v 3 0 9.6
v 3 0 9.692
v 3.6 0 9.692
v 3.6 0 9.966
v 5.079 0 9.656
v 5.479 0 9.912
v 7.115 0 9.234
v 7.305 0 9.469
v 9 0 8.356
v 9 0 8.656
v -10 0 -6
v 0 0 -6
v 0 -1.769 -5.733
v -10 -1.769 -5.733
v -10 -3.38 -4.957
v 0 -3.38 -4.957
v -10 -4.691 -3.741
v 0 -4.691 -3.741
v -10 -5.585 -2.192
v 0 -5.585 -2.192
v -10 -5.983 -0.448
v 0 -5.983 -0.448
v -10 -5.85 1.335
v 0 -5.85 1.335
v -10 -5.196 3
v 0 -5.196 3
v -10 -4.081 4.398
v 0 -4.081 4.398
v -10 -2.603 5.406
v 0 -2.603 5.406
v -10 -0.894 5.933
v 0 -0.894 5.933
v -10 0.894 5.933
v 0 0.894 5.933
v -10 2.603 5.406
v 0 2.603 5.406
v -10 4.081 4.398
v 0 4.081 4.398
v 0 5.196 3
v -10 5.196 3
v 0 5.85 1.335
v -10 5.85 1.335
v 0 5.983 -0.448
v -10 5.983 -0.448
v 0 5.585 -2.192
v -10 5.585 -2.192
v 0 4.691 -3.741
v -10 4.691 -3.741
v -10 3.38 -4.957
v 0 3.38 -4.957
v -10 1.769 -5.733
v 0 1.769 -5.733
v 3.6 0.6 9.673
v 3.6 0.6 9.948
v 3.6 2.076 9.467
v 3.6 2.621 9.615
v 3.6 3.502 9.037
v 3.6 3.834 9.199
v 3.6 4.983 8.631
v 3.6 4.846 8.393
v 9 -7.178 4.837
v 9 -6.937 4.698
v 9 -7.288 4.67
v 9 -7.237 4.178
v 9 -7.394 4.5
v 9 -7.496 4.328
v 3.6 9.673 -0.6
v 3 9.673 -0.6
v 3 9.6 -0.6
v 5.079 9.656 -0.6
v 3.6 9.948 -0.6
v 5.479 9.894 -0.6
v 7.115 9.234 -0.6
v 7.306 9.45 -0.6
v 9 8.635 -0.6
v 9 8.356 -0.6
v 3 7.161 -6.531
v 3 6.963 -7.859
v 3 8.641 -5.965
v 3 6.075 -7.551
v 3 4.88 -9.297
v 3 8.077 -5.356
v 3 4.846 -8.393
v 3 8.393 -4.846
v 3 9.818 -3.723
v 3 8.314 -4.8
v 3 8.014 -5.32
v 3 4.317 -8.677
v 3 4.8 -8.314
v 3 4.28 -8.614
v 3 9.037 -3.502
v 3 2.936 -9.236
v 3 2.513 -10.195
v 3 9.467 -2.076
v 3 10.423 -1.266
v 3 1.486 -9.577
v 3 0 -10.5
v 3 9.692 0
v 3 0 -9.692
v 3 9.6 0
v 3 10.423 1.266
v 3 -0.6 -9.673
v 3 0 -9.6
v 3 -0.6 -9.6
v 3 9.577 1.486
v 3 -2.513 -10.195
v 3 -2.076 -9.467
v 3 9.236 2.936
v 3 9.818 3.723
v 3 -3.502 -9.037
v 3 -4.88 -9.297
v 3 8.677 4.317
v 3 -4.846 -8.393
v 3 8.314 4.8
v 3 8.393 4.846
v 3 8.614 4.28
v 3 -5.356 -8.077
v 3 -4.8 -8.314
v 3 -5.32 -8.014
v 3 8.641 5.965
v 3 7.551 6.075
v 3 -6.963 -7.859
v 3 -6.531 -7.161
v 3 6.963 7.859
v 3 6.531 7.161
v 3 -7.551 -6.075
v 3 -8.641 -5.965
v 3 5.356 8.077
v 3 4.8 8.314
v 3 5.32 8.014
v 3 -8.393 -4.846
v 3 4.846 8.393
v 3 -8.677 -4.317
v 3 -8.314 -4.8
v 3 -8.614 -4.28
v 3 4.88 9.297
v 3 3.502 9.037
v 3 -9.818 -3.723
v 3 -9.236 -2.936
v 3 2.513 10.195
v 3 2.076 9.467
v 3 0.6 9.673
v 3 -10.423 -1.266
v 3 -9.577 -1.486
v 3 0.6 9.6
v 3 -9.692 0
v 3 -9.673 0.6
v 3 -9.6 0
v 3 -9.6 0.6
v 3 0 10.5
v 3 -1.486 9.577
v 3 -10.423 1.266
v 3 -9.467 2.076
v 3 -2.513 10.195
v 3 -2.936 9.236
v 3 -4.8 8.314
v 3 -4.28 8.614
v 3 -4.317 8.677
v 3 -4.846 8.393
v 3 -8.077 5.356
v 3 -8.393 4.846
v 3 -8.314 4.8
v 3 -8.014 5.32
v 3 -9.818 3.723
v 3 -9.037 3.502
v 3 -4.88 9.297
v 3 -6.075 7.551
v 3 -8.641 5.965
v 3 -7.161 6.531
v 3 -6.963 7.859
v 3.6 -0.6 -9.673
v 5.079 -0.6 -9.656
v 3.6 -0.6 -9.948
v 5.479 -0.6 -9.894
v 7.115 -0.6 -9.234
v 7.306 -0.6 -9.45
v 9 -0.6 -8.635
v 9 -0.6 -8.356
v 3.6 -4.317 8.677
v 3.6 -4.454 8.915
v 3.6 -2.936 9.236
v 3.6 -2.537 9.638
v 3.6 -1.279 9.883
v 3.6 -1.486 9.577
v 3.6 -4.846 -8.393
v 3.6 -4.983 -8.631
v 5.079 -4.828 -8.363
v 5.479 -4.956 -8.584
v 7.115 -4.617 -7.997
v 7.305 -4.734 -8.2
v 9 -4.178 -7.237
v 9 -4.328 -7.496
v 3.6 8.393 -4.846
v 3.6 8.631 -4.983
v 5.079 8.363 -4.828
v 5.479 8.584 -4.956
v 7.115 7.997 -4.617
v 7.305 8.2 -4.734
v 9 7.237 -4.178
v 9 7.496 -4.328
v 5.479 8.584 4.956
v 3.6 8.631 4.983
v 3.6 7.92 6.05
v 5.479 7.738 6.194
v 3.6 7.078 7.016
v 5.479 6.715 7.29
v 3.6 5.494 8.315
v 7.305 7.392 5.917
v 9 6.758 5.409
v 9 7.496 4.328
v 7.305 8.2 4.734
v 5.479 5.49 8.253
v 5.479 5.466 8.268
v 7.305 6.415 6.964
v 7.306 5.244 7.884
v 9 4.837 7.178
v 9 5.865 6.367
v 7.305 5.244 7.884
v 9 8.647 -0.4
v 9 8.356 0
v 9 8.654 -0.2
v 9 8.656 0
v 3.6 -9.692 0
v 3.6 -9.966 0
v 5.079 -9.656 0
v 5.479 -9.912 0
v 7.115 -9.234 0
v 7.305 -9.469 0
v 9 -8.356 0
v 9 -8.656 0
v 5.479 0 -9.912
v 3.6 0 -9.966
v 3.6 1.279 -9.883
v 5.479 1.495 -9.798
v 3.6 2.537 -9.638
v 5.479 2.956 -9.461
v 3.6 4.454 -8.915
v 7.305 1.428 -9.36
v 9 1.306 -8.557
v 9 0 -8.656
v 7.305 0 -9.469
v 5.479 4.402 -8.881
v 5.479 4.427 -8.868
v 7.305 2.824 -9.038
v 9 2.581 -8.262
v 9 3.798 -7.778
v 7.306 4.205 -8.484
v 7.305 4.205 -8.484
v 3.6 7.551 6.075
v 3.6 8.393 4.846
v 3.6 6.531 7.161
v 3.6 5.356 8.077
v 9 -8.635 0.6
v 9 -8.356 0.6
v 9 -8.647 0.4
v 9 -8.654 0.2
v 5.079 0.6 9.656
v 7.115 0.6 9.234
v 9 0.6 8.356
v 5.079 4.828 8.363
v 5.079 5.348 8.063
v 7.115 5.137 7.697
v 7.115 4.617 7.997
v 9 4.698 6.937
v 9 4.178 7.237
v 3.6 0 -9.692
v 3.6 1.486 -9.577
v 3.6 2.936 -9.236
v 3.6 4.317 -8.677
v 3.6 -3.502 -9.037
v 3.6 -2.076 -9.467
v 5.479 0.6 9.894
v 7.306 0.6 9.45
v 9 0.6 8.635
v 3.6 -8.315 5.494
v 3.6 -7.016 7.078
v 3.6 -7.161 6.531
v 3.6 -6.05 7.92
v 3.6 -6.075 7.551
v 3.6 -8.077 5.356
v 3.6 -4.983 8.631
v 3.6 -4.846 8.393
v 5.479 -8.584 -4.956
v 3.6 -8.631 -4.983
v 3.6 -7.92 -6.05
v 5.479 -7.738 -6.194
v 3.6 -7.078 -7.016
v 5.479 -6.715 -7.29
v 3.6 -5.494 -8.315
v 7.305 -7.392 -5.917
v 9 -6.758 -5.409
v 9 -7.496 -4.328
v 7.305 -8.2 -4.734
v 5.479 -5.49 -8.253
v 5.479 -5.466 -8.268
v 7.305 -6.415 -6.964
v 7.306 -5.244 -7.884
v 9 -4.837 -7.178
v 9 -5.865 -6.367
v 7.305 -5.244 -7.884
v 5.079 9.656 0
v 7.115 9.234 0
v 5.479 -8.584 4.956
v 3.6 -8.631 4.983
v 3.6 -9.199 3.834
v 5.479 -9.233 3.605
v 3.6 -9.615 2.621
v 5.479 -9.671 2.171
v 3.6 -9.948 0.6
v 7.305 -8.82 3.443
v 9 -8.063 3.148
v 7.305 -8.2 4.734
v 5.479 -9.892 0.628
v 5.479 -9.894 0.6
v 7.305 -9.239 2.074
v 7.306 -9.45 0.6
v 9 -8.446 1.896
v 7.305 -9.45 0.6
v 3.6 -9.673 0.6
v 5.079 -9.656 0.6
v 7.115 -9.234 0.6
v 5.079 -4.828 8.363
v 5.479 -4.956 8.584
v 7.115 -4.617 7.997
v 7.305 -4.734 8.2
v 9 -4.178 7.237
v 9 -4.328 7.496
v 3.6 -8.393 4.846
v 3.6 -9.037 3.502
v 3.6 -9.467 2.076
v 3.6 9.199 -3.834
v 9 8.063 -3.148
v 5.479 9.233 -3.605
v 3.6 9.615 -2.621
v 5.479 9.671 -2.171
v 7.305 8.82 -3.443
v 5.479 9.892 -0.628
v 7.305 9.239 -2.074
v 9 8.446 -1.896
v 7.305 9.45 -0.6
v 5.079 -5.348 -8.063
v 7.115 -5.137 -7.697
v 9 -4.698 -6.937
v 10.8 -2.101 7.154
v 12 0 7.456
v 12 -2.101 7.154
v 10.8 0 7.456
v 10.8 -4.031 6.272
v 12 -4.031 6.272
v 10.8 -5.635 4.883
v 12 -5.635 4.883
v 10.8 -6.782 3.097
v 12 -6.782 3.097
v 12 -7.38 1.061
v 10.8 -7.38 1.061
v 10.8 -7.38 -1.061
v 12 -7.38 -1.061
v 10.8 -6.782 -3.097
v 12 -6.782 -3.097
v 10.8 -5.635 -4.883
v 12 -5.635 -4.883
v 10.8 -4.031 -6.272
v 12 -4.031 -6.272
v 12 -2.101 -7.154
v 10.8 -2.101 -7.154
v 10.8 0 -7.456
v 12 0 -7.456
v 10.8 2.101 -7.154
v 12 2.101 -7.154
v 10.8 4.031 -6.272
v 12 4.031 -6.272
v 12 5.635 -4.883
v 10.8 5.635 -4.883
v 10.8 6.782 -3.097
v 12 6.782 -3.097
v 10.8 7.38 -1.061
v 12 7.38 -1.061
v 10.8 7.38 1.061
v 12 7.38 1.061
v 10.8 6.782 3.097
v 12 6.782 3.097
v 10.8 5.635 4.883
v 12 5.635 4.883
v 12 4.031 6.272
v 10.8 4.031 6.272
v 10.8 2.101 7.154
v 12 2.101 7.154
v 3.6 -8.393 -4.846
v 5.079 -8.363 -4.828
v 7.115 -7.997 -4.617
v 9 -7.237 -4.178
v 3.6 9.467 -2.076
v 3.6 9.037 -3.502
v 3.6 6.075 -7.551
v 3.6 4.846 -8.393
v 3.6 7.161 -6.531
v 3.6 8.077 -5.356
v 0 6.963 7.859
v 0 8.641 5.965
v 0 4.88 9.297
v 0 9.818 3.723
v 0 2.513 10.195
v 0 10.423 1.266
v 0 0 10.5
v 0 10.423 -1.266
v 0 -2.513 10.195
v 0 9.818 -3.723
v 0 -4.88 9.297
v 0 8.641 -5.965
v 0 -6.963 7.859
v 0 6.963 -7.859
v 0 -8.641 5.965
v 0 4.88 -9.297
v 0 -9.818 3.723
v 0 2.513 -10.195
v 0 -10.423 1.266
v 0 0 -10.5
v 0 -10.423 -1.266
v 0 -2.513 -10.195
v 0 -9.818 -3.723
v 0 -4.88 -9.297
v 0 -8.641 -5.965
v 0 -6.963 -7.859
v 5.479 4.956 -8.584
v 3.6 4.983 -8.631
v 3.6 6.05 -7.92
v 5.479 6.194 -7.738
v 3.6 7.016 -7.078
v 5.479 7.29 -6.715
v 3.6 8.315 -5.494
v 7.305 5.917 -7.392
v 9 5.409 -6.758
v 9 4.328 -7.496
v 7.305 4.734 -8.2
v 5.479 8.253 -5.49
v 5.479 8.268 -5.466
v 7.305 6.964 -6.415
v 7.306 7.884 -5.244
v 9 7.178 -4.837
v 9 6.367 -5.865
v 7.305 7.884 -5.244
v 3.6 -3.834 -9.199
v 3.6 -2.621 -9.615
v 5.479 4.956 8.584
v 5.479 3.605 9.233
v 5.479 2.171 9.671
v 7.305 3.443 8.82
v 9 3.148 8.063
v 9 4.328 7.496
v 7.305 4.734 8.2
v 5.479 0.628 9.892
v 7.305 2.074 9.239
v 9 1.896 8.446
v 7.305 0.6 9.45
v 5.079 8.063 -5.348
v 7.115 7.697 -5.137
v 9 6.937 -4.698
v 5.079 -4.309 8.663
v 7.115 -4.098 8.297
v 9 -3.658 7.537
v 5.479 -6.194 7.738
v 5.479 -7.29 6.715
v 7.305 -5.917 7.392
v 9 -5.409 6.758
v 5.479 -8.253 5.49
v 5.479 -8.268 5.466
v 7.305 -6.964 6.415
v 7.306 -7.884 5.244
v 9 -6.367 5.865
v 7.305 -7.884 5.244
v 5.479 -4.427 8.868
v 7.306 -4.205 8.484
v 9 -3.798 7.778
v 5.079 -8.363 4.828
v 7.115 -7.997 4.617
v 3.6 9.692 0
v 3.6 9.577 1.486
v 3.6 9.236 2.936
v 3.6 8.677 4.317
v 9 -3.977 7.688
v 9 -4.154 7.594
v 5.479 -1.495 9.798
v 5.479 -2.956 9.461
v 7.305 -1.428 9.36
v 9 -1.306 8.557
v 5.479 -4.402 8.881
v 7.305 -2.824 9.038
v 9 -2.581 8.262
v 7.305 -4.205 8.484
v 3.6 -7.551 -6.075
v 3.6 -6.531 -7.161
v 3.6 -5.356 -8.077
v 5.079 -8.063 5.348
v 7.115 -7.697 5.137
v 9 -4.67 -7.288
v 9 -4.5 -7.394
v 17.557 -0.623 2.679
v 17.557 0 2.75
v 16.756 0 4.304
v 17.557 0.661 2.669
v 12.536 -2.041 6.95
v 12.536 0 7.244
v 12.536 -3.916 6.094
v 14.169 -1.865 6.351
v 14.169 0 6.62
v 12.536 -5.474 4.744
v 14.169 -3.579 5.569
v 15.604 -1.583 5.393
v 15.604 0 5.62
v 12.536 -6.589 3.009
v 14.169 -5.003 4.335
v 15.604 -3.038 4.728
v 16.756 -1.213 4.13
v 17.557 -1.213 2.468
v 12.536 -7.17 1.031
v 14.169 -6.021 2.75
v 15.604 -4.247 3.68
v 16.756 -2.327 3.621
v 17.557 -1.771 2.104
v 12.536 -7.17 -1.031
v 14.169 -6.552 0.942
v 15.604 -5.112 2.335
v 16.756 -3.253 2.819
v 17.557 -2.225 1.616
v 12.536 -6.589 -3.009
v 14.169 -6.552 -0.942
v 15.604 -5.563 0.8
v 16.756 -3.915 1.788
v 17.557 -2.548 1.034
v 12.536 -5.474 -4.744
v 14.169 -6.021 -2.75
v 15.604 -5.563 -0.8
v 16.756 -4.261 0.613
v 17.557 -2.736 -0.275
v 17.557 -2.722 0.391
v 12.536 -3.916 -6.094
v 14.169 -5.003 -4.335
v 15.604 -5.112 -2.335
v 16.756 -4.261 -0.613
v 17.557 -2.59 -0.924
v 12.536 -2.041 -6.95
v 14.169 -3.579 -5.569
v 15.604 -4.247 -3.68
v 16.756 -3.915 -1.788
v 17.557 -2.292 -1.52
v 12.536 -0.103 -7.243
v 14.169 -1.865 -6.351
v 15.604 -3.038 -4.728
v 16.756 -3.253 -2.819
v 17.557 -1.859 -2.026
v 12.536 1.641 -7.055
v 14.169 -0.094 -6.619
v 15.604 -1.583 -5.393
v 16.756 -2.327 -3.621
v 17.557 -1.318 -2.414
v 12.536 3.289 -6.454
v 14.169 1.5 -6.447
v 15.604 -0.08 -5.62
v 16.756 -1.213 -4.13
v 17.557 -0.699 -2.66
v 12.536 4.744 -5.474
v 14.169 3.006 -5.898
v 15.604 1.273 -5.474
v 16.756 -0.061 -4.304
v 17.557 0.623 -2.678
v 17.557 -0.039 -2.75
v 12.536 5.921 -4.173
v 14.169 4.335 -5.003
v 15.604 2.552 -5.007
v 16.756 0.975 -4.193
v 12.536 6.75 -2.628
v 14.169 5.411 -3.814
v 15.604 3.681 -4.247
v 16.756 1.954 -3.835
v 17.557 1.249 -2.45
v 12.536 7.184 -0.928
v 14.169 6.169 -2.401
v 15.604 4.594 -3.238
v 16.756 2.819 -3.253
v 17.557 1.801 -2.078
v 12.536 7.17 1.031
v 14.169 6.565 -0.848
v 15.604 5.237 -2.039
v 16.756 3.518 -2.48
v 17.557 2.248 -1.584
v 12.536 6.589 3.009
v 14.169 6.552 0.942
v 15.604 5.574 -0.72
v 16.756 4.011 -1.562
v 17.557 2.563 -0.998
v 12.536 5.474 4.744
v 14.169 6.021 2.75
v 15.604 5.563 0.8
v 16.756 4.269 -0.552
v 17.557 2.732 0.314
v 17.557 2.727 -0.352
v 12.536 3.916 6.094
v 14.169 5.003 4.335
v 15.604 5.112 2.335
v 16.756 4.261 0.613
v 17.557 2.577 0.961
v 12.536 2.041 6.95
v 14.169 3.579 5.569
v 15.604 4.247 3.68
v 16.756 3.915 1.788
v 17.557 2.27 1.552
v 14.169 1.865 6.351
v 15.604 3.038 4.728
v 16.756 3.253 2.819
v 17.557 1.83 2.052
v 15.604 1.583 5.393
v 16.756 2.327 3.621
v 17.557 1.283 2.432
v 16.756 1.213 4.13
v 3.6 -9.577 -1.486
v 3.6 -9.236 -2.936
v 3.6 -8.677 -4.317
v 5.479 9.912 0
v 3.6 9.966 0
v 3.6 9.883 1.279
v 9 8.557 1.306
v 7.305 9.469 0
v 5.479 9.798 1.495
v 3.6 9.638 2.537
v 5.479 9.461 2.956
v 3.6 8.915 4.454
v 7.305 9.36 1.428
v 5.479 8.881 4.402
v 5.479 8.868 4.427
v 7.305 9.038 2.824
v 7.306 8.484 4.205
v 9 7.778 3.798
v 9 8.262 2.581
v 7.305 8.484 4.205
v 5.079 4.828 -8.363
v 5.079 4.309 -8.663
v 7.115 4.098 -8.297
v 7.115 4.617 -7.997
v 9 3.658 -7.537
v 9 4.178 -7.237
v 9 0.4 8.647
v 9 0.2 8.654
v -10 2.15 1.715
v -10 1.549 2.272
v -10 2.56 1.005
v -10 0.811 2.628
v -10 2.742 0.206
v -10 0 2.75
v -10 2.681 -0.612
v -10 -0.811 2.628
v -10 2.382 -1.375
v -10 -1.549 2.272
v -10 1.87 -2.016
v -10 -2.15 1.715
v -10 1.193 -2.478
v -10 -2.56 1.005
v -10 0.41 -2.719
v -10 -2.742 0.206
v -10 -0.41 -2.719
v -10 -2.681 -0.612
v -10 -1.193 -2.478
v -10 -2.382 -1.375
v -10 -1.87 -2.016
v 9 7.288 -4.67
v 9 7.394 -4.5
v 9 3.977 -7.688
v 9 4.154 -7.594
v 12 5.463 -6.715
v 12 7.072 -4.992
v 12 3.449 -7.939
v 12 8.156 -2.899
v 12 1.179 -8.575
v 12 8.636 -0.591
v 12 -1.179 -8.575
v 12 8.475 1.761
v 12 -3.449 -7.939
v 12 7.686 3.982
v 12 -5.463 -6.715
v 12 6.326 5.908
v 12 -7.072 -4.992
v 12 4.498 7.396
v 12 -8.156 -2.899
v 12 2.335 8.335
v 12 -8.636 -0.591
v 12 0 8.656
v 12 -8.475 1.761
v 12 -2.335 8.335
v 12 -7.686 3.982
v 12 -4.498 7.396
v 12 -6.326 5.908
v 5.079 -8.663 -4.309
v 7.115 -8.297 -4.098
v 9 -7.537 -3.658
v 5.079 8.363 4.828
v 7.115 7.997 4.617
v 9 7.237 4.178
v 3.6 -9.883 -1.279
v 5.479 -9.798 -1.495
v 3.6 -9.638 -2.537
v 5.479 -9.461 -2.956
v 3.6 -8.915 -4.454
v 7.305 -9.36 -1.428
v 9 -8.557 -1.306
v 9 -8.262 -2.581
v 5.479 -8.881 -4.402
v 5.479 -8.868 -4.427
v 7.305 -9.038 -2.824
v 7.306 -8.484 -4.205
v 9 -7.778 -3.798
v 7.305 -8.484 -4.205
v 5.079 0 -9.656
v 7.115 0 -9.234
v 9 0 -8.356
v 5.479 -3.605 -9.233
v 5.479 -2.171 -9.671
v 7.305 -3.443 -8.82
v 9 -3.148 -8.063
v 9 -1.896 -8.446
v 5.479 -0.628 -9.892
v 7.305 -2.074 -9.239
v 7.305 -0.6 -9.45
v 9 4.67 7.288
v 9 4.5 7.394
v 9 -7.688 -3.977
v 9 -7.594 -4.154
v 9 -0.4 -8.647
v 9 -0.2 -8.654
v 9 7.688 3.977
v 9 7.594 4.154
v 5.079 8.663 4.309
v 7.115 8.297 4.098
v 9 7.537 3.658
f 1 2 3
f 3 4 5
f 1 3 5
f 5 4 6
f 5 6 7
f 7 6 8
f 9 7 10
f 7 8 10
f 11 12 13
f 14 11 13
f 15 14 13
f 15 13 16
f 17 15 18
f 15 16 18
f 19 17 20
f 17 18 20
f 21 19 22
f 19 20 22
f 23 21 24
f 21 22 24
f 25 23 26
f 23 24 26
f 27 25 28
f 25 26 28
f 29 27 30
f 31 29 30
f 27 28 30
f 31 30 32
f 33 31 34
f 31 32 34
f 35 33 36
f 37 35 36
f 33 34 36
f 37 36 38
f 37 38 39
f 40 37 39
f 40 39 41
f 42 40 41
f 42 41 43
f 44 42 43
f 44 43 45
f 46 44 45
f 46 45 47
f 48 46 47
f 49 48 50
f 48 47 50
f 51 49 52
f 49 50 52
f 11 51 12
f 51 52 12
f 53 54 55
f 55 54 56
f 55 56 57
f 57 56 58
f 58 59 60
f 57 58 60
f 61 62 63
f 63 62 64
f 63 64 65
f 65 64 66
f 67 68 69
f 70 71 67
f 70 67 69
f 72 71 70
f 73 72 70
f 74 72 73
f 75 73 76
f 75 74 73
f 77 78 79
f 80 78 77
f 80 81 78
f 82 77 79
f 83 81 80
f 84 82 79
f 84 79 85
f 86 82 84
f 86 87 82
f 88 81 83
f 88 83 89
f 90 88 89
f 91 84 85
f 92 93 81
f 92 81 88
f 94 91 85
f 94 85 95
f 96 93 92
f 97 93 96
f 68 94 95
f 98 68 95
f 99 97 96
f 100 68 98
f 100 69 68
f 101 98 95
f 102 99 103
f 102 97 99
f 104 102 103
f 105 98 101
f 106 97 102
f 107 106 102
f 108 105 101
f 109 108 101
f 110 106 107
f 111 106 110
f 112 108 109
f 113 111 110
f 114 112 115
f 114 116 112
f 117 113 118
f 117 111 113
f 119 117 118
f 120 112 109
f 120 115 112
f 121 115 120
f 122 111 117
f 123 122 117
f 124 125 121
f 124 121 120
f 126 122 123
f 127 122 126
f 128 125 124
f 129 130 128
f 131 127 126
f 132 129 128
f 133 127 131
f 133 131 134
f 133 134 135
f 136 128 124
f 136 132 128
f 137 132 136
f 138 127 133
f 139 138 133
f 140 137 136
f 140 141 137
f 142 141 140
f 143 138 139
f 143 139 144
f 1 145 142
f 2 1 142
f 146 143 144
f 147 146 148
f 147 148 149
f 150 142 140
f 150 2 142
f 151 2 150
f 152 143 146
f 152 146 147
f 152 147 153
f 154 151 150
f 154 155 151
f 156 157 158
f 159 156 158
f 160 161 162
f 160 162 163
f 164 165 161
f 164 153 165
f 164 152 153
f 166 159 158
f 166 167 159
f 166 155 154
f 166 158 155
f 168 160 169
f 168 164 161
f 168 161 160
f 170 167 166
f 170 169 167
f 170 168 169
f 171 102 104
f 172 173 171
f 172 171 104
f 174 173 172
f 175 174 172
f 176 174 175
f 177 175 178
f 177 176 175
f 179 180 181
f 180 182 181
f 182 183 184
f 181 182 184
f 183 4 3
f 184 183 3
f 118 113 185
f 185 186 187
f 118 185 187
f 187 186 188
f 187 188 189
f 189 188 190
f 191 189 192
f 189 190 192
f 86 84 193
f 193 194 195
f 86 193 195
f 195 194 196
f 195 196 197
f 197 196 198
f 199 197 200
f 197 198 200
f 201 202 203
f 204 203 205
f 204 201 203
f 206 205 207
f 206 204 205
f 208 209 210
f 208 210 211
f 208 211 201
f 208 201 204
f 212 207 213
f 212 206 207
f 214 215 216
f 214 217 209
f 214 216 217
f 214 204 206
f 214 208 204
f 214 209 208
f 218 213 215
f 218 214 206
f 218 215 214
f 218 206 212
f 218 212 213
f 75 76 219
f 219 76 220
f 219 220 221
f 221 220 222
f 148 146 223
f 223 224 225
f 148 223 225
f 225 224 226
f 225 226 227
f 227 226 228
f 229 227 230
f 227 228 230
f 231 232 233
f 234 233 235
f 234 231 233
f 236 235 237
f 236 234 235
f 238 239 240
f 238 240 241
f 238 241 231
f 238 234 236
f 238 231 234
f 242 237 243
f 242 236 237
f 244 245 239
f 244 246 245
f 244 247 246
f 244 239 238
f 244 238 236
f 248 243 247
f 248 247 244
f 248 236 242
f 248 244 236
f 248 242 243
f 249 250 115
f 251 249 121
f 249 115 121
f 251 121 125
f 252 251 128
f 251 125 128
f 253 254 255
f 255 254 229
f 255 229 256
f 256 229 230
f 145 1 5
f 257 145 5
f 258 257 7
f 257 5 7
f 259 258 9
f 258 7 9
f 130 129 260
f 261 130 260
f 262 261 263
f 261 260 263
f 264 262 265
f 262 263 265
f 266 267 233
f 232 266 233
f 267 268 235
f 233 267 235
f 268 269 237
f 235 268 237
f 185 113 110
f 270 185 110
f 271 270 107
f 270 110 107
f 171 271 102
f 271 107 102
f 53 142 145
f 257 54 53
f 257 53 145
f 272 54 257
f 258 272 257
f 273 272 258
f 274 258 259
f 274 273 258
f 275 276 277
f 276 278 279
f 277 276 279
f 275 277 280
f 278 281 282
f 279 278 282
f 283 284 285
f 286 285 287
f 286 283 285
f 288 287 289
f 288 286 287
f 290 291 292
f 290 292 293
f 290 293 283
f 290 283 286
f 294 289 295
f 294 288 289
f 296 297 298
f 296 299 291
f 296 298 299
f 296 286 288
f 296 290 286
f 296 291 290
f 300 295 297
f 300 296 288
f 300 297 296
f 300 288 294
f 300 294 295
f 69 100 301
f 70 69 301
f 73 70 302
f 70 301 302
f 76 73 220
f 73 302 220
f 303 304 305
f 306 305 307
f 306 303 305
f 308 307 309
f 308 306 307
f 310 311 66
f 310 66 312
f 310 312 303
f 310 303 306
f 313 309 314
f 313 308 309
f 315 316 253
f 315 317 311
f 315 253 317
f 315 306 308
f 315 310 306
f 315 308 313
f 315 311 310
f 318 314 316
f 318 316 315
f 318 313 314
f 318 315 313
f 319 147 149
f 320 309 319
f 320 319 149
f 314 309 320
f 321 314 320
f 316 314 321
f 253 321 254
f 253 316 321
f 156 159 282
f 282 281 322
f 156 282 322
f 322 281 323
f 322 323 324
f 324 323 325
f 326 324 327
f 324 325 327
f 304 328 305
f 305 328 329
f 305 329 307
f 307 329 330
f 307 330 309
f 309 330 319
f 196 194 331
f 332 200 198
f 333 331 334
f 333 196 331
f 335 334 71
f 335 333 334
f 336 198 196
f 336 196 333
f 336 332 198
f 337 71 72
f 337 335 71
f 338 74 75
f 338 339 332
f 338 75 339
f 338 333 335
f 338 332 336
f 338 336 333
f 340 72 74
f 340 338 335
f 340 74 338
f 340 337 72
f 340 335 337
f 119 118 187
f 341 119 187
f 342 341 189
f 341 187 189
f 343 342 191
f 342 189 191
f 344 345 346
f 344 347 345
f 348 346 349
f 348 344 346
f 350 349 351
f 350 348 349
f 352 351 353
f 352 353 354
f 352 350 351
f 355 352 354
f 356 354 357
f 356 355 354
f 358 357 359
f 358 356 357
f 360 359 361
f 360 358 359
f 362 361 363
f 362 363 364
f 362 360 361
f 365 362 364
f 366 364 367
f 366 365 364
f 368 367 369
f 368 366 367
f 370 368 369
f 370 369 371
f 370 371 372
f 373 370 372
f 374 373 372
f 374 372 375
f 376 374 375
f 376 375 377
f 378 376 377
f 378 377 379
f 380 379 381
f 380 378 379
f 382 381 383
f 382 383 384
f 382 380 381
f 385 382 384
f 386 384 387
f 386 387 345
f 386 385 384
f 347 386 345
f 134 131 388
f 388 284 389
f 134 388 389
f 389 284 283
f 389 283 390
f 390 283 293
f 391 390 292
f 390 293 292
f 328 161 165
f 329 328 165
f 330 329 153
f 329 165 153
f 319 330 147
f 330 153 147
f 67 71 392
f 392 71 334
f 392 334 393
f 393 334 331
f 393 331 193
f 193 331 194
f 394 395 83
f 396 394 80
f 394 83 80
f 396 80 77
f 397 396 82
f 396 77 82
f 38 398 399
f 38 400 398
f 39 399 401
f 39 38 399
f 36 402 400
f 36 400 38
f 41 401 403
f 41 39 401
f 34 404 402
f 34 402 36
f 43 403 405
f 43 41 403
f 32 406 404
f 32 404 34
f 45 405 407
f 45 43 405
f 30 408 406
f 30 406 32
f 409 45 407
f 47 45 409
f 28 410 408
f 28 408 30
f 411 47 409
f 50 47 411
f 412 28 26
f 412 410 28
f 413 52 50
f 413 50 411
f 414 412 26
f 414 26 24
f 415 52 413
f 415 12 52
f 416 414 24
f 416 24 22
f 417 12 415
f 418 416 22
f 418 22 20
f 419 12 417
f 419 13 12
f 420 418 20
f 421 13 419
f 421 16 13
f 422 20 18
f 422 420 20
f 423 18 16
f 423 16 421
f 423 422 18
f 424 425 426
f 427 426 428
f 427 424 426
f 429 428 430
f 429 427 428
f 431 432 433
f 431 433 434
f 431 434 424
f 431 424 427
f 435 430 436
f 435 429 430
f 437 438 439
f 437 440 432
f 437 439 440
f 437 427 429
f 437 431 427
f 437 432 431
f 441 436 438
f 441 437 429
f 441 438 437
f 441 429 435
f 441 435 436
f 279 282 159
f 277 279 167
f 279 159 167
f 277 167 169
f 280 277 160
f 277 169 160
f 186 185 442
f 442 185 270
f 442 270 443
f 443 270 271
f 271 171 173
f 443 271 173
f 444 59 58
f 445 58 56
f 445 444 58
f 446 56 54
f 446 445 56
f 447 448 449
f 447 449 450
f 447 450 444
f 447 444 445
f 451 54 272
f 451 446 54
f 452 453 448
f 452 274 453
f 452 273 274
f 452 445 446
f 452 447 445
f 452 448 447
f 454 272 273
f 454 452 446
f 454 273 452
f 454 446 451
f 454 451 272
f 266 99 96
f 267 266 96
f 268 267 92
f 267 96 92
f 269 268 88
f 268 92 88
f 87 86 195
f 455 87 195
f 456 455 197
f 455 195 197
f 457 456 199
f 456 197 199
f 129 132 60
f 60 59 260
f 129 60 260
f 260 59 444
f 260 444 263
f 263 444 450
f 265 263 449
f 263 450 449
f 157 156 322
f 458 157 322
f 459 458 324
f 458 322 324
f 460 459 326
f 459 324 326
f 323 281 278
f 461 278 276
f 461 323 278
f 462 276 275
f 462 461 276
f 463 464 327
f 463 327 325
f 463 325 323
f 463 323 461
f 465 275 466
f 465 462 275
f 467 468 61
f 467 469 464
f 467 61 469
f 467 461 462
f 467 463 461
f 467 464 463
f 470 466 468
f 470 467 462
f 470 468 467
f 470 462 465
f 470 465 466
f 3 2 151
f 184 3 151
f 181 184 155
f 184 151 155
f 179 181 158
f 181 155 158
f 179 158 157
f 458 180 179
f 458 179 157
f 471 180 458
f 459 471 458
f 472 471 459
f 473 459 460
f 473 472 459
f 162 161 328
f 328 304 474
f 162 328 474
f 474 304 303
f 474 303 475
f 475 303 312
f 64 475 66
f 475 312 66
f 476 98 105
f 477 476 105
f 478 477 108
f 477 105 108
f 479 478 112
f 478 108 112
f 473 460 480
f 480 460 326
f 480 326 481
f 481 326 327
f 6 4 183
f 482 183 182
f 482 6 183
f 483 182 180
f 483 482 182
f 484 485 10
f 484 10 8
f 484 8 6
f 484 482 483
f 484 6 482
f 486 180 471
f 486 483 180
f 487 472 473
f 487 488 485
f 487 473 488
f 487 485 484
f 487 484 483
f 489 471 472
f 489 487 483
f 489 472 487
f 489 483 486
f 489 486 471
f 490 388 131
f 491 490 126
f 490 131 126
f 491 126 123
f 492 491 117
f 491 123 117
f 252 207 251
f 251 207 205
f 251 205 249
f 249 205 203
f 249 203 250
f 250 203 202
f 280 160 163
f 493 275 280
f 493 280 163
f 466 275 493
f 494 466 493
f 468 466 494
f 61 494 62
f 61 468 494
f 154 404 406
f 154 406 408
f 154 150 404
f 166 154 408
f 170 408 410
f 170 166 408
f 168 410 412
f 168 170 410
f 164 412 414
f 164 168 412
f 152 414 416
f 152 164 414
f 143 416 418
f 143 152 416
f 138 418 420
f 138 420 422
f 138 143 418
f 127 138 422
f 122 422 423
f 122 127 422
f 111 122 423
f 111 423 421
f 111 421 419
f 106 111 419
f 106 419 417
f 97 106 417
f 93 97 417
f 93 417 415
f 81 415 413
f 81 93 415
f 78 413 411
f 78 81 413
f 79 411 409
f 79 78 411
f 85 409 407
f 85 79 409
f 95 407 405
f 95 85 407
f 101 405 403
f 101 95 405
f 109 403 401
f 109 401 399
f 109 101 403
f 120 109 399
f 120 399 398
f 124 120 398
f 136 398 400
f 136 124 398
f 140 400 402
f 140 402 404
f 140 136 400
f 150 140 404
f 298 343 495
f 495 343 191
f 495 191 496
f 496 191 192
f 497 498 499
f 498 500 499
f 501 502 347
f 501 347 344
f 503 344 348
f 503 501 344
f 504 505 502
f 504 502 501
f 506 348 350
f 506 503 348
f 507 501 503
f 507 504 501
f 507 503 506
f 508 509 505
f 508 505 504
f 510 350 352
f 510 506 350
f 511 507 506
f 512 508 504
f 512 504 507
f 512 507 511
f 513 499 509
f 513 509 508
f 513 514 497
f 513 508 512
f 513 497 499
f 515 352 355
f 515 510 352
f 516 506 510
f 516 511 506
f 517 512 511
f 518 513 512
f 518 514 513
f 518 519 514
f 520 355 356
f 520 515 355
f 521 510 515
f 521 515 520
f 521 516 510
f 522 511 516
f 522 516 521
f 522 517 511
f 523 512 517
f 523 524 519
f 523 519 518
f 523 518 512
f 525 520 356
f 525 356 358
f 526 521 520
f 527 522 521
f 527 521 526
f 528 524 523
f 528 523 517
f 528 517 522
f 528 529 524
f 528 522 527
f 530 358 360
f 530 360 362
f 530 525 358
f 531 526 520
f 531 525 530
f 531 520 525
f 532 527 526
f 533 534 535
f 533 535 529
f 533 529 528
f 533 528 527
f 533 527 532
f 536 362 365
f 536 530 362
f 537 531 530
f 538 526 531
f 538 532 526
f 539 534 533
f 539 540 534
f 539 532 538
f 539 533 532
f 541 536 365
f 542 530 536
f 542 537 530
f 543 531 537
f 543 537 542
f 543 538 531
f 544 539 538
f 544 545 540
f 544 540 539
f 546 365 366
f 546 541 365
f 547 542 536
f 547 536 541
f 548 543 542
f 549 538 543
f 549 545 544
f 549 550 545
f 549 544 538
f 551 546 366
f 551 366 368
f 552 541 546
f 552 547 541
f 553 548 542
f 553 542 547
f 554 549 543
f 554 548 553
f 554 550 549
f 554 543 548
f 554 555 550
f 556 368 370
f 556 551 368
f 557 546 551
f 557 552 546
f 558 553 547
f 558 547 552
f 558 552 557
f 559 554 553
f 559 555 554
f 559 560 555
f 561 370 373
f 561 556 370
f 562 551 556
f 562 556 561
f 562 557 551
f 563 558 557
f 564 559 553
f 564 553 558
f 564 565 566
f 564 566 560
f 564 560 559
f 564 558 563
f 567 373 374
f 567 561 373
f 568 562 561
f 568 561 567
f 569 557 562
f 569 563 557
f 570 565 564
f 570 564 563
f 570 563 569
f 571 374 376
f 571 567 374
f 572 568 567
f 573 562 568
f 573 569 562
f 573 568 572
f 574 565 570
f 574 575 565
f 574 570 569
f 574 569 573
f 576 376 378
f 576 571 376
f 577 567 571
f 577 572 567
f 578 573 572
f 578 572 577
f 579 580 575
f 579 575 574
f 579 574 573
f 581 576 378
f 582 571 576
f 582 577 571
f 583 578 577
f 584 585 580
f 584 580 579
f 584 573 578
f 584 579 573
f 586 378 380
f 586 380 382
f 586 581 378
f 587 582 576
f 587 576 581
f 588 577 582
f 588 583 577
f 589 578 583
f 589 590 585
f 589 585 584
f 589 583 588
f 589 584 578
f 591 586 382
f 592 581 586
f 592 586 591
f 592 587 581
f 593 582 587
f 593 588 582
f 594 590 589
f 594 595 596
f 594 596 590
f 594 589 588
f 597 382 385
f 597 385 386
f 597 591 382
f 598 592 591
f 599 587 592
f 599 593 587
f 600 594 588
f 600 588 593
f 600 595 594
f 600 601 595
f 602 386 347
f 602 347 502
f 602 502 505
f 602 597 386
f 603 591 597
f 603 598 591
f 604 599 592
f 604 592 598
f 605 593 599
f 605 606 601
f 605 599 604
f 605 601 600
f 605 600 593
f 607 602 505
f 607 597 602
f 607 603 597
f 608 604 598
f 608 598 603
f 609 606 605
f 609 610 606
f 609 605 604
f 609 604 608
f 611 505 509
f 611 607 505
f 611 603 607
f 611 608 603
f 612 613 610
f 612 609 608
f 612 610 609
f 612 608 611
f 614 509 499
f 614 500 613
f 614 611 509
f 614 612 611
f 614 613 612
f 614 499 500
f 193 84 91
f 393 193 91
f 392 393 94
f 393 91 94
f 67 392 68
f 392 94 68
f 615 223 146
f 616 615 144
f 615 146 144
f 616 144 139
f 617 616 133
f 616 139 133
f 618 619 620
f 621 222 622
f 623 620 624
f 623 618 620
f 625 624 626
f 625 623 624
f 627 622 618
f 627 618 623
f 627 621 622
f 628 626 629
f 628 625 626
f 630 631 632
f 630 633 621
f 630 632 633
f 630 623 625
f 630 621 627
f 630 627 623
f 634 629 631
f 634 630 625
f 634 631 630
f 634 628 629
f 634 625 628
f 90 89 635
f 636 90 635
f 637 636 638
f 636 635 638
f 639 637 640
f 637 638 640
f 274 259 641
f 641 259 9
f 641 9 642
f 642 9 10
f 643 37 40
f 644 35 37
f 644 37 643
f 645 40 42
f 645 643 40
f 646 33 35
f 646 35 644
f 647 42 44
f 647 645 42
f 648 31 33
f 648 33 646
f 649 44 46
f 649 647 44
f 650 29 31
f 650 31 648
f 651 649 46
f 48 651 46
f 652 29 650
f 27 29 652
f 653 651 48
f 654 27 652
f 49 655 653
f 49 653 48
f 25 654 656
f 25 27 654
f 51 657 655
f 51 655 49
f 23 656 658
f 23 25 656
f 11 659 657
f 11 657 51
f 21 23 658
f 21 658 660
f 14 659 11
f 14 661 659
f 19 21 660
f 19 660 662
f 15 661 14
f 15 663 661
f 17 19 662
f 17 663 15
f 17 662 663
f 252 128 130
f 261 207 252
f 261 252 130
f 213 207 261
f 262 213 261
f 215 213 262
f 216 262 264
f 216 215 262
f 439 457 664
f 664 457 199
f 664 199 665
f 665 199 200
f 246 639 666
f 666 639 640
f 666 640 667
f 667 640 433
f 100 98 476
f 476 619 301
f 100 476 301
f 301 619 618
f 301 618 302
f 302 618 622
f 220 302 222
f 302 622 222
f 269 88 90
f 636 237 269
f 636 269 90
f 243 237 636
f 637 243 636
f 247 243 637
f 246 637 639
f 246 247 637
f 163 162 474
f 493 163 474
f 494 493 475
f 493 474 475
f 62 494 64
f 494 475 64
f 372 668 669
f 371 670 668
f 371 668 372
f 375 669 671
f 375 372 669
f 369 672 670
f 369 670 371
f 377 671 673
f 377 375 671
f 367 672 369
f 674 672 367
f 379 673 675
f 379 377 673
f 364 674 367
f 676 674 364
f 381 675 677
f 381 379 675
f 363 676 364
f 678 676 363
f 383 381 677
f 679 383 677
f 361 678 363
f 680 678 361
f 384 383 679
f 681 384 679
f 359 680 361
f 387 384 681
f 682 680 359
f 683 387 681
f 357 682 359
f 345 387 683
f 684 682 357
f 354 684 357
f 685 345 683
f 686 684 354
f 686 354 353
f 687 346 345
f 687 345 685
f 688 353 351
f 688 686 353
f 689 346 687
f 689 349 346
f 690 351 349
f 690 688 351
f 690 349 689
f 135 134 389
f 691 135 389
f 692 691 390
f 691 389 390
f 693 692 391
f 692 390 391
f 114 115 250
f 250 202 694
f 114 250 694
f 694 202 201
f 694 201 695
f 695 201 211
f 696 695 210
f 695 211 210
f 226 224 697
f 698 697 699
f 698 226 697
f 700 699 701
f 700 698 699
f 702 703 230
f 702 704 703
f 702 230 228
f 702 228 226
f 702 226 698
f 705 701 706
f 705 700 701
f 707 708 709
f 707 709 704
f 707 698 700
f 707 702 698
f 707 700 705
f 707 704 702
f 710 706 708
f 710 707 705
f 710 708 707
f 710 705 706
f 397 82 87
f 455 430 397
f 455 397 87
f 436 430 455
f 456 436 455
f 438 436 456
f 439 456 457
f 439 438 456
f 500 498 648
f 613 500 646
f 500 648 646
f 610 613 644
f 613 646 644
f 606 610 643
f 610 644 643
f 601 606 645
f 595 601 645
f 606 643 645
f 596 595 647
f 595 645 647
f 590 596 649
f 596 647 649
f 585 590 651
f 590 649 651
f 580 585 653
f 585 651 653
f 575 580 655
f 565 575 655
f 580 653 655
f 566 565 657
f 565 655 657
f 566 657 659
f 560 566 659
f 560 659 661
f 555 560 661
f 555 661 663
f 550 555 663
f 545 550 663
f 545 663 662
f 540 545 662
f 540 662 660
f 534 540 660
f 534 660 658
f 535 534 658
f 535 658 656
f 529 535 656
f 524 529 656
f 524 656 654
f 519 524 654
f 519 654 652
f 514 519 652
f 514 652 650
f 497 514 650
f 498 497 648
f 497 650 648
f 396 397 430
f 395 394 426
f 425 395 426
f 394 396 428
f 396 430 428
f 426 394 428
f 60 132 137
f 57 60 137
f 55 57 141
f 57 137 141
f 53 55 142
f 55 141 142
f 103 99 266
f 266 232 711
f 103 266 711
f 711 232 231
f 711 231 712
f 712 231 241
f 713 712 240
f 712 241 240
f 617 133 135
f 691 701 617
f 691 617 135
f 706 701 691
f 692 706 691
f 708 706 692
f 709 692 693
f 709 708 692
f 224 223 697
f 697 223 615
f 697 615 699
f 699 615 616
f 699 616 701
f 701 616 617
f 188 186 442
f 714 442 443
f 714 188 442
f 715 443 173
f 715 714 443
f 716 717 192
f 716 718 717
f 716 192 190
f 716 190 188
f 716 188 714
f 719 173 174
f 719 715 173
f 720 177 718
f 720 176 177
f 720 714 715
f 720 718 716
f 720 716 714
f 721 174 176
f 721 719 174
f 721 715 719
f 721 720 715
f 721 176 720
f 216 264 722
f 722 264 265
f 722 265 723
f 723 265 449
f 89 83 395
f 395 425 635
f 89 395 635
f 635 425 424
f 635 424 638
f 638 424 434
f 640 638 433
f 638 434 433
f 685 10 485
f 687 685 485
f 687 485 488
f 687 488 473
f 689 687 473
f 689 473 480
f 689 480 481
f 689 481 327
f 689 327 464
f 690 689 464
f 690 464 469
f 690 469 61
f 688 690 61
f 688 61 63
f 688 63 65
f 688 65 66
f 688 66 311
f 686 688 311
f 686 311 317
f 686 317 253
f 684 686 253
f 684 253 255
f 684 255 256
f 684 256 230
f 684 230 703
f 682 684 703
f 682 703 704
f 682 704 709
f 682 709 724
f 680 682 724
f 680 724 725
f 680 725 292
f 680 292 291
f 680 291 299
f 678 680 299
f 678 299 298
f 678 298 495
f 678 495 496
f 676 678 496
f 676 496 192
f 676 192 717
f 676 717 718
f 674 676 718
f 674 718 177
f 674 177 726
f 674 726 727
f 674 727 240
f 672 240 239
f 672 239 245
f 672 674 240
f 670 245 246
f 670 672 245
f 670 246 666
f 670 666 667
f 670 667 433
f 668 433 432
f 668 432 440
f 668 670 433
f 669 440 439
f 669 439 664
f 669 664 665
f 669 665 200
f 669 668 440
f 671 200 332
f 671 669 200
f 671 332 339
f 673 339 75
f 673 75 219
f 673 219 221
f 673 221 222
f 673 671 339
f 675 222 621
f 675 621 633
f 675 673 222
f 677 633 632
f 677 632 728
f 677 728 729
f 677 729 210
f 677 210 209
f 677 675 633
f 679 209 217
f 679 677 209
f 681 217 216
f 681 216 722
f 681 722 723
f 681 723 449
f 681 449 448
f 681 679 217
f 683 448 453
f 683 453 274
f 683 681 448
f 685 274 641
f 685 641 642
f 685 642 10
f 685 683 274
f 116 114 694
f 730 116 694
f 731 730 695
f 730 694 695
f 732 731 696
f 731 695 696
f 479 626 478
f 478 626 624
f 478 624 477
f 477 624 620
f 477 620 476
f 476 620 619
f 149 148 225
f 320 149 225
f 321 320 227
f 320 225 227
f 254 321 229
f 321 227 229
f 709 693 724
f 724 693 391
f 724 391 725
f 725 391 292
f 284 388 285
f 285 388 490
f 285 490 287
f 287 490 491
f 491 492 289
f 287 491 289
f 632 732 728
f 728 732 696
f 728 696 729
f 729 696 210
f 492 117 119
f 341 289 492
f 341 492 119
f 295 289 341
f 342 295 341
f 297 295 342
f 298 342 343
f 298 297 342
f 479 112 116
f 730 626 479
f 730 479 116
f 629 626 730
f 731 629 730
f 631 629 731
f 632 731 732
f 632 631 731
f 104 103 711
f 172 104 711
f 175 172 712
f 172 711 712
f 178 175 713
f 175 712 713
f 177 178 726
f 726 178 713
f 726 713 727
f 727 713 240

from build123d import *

# Parameters (mm, degrees)
ENL_V_MAT_EXTRU_2_DEPTH      = 1
R_P_TITION_CIRCULAIRE1_COUNT = 12
ESQUISSE9_R                  = 16.652952846
ESQUISSE9_R_2                = 16.152952846
ENL_V_MAT_EXTRU_3_DEPTH      = 1
ECHELLE3_SCALE               = 0.6
ESQUISSE12_R                 = 6
BOSS_EXTRU_2_DEPTH           = 10
ESQUISSE13_R                 = 2.75
ENL_V_MAT_EXTRU_5_DEPTH      = 32.69773054


with BuildPart() as part:
    # Esquisse3 → Révolution3 (revolve)
    with BuildSketch(Plane.XY, mode=Mode.PRIVATE) as r_volution3_sk:
        with BuildLine():
            Line((5, 17.5), (5, 16.5))
            ThreePointArc((5, 16.5), (10.181885267, 16.340581134), (15, 14.426653308))
            Line((15, 14.426653308), (20, 14.426653308))
            Line((20, 14.426653308), (20, 12.426653308))
            Line((20, 12.426653308), (18, 12.426653308))
            ThreePointArc((18, 12.426653308), (26.637443378, 8.760216774), (30, 0))
            Line((30, 0), (0, 0))
            Line((0, 0), (0, 17.5))
            Line((0, 17.5), (5, 17.5))
        make_face()
    revolve(r_volution3_sk.sketch.rotate(Axis((-14.762690298, 0, 0), (1, 0, 0)), 90), axis=Axis((-14.762690298, 0, 0), (1, 0, 0)))

    # Esquisse8 → Enlèv. mat.-Extru.2 (cut)
    with BuildSketch(Plane(origin=(0, 0, 0), x_dir=(1, 0, 0), z_dir=(0, 1, 0))):
        with BuildLine():
            Line((5, 16.5), (5, 16))
            ThreePointArc((5, 16), (10.181885267, 15.840581134), (15, 13.926653308))
            Line((15, 13.926653308), (15, 14.426653308))
            ThreePointArc((15, 14.426653308), (10.181885267, 16.340581134), (5, 16.5))
        make_face()
    enl_v_mat_extru_2 = extrude(amount=-ENL_V_MAT_EXTRU_2_DEPTH, mode=Mode.SUBTRACT)

    # Répétition circulaire1: Enlèv. mat.-Extru.2 ×12 about axis
    r_p_tition_circulaire1_axis = Axis((0, 0, 0), (1, 0, 0))
    for i in range(1, R_P_TITION_CIRCULAIRE1_COUNT):
        add(enl_v_mat_extru_2.rotate(r_p_tition_circulaire1_axis, i * 360 / R_P_TITION_CIRCULAIRE1_COUNT), mode=Mode.SUBTRACT)

    # Esquisse9 → Enlèv. mat.-Extru.3 (cut)
    with BuildSketch(Plane(origin=(5, 0, 0), x_dir=(0, 0, -1), z_dir=(1, 0, 0))):
        Circle(ESQUISSE9_R)
        Circle(ESQUISSE9_R_2, mode=Mode.SUBTRACT)
    extrude(amount=ENL_V_MAT_EXTRU_3_DEPTH, mode=Mode.SUBTRACT)


with BuildPart() as part_1:
    # Echelle3: scaled about (0, 0, 0)
    add(part.part.scale(ECHELLE3_SCALE))

    # Esquisse12 → Boss.-Extru.2 (add)
    with BuildSketch(Plane.ZY):
        with Locations(Location((0, 0, 0), (0, 0, 180))):
            Circle(ESQUISSE12_R)
    extrude(amount=BOSS_EXTRU_2_DEPTH)

    # Esquisse13 → Enlèv. mat.-Extru.5 (cut, through all)
    with BuildSketch(Plane.ZY.offset(10)):
        Circle(ESQUISSE13_R)
    extrude(amount=-ENL_V_MAT_EXTRU_5_DEPTH, mode=Mode.SUBTRACT)


solid = part_1.part
